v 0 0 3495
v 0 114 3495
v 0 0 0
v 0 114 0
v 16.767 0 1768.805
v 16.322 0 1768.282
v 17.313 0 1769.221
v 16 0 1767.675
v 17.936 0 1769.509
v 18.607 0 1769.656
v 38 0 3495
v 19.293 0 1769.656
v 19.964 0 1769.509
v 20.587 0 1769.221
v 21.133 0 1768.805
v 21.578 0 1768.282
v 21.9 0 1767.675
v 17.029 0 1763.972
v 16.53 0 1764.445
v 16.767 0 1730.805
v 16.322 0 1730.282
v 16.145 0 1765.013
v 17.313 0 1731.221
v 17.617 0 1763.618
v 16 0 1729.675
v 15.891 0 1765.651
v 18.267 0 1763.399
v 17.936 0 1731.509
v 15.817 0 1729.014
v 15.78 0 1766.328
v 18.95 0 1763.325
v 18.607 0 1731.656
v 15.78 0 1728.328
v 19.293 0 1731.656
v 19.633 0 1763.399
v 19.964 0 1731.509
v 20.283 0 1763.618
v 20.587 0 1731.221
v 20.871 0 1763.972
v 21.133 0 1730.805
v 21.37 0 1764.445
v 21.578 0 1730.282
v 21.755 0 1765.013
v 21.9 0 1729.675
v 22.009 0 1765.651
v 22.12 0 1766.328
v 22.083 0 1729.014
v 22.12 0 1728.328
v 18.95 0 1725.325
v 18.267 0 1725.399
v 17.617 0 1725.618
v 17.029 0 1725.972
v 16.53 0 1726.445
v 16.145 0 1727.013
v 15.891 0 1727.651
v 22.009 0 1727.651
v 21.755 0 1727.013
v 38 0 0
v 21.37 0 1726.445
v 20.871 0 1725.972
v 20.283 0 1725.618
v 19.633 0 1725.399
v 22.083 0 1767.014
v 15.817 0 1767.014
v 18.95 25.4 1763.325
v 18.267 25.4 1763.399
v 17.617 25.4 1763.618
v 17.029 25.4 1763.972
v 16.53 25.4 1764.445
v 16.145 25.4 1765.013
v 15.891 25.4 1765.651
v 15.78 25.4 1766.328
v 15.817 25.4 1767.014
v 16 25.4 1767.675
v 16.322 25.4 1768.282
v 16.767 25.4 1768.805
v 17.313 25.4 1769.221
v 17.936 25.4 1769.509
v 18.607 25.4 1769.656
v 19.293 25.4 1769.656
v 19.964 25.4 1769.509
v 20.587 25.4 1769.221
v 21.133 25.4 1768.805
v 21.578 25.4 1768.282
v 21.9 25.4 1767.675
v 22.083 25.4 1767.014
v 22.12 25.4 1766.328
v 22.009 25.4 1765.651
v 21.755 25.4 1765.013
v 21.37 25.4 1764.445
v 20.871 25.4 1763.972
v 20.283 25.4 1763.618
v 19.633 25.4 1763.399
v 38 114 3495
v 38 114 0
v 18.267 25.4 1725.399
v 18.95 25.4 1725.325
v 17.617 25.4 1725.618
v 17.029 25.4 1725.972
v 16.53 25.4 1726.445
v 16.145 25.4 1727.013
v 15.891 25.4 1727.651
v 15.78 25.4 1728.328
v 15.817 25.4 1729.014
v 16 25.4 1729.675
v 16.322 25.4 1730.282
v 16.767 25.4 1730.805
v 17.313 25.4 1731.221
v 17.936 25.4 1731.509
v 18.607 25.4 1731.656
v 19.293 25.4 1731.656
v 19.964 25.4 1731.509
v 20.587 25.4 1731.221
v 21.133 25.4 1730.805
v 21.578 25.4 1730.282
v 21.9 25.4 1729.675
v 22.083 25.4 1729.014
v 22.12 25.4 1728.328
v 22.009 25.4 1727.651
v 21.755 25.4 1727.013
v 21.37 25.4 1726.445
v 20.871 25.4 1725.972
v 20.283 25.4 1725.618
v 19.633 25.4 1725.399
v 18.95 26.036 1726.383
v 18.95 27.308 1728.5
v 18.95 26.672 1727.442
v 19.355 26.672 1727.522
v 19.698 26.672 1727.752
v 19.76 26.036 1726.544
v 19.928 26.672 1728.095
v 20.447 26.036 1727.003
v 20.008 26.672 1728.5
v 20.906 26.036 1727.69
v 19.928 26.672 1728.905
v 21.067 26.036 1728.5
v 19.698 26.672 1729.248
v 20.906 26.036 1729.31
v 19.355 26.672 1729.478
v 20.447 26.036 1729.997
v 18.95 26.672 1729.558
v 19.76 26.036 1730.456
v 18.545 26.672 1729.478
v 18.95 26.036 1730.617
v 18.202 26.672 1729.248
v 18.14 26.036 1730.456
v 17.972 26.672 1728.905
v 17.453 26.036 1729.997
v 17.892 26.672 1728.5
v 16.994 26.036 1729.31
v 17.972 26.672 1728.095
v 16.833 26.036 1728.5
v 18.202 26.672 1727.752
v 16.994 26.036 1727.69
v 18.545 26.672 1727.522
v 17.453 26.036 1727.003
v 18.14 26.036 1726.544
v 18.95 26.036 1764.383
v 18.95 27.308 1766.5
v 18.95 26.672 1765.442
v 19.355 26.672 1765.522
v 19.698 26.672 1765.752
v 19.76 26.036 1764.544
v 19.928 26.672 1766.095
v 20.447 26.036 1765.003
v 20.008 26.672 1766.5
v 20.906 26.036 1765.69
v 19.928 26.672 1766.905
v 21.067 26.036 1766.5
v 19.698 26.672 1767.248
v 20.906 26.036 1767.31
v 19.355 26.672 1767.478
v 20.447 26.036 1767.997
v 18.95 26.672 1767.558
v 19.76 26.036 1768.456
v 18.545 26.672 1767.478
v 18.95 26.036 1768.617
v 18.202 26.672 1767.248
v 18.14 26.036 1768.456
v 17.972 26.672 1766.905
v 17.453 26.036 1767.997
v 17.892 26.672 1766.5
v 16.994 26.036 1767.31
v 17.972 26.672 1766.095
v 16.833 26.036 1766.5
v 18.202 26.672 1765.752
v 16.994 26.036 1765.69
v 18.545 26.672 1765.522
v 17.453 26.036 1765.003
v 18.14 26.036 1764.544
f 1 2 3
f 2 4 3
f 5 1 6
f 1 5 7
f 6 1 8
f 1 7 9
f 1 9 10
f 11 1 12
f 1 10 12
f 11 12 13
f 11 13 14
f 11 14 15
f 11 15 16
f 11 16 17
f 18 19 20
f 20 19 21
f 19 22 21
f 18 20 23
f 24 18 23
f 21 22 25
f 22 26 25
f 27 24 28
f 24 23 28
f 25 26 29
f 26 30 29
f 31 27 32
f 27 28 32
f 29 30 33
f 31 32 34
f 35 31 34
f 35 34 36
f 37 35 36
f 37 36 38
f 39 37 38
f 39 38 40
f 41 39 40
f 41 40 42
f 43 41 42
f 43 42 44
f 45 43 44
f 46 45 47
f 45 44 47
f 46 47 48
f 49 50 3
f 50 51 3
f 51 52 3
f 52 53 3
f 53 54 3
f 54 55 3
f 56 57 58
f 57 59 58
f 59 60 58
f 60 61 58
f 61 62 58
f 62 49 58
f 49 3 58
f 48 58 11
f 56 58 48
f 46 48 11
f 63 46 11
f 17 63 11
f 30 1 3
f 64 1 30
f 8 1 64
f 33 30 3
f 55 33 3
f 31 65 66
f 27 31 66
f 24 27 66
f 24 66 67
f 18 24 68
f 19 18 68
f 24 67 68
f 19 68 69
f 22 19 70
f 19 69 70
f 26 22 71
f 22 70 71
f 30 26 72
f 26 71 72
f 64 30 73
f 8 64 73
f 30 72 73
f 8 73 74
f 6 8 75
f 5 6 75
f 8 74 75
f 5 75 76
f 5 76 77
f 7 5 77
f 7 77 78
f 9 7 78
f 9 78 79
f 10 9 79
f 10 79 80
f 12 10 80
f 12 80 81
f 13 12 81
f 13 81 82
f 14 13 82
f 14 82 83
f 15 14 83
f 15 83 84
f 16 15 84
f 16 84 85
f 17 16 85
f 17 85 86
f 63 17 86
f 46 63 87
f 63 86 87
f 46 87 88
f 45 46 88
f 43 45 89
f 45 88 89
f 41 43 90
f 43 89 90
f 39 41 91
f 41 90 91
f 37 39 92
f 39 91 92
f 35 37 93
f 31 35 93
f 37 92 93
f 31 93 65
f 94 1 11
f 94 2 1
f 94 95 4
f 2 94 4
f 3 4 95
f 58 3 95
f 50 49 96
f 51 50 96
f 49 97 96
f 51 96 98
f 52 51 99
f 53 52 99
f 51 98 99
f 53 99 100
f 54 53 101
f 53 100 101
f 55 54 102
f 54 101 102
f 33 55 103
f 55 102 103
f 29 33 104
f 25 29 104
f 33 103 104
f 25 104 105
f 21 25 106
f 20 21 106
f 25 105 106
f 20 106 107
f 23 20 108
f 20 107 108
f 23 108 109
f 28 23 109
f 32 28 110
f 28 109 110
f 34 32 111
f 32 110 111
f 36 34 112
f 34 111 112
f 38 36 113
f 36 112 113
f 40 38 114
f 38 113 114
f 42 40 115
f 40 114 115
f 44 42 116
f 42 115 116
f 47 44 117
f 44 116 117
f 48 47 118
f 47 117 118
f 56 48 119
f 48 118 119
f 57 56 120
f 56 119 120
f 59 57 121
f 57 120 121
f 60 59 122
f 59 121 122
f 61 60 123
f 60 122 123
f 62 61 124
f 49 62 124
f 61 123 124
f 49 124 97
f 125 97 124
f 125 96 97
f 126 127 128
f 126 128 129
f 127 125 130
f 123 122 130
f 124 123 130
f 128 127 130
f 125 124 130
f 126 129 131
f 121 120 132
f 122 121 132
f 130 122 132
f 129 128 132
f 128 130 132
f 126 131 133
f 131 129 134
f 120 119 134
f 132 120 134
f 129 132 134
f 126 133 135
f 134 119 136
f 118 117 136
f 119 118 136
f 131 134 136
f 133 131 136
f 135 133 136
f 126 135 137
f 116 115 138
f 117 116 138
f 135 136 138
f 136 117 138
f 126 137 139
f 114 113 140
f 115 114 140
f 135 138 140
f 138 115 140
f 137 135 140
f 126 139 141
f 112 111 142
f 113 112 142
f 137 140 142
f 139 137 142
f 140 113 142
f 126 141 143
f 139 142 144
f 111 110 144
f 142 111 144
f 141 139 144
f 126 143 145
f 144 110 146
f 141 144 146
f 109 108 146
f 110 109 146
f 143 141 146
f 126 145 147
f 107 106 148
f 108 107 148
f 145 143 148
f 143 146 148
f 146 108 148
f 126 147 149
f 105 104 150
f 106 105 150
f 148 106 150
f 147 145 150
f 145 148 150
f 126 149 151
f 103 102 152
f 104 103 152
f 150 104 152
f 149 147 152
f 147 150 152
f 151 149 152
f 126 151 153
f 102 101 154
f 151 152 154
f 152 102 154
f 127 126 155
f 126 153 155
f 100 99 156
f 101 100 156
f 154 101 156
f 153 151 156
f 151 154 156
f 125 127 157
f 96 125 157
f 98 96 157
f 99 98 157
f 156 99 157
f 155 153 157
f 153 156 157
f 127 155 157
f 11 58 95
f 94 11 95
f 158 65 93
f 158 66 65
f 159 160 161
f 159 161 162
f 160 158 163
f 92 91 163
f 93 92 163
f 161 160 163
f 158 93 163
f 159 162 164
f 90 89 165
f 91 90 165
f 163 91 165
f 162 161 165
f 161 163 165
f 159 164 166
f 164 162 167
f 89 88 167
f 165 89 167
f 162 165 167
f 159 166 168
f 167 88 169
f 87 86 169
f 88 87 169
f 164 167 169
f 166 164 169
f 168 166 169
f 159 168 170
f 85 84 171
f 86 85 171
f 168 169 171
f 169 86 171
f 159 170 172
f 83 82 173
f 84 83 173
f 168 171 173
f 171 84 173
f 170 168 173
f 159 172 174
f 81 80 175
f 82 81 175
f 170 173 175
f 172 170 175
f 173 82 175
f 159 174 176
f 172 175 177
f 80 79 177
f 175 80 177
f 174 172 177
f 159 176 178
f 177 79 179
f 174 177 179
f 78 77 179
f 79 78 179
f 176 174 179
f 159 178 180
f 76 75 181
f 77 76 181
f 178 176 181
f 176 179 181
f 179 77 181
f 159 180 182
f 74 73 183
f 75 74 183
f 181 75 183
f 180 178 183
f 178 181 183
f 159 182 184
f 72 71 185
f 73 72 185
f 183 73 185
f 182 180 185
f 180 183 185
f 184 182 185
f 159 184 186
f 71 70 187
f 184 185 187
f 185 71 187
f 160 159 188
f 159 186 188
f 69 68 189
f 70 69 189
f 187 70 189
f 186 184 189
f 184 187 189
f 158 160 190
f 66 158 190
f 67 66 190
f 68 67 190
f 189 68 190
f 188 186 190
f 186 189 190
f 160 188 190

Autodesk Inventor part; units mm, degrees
ref_plane "YZ Plane" through (0, 0, 0) normal (1, 0, 0) x (0, 1, 0)
ref_plane "XZ Plane" through (0, 0, 0) normal (0, 1, 0) x (-1, 0, 0)
ref_plane "XY Plane" through (0, 0, 0) normal (0, 0, 1) x (1, 0, 0)
sketch "Sketch1" plane through (0, 0, 0) normal (0, 0, 1) x (1, 0, 0)
  line L0 (0, 0) -> (38, 0)
  line L1 (38, 0) -> (38, 114)
  line L2 (38, 114) -> (0, 114)
  line L3 (0, 114) -> (0, 0)
  dimension "d0" = 38
  dimension "d1" = 114
extrude "Extrusion1" add sketch "Sketch1" along normal blind 3495
sketch "Sketch2" plane through (38, 0, 0) normal (0, -1, 0) x (1, 0, 0)
  line L0 (0, 0) -> (0, 3495) projected
  line L1 (-38, 0) -> (-38, 3495) projected
  circle A0 centre (-19.05, 1766.5) radius 1.4111
  circle A1 centre (-19.05, 1728.5) radius 1.4111
  line L2 (-38, 1747.5) -> (0, 1747.5) construction
  dimension "d8" = 38
  dimension "d22" = 19
hole "Hole1" at (18.95, 0, 1766.5) at (18.95, 0, 1728.5) direction (0, 1, 0) diameter 6.35 depth 25.4 tip angle 118
sketch "Sketch4" plane through (0, 0, 0) normal (-1, 0, 0) x (0, 0, 1)
  line L0 (0, 114) -> (0, 0) projected
  line L1 (0, 0) -> (3495, 0) projected
  line L2 (3495, 114) -> (3495, 0) projected
  line L3 (0, 114) -> (3495, 114) projected
  line L4 (1747.5, 0) -> (1747.5, 114) construction
properties part number "2p4rim" material "Wood (Cherry)"
